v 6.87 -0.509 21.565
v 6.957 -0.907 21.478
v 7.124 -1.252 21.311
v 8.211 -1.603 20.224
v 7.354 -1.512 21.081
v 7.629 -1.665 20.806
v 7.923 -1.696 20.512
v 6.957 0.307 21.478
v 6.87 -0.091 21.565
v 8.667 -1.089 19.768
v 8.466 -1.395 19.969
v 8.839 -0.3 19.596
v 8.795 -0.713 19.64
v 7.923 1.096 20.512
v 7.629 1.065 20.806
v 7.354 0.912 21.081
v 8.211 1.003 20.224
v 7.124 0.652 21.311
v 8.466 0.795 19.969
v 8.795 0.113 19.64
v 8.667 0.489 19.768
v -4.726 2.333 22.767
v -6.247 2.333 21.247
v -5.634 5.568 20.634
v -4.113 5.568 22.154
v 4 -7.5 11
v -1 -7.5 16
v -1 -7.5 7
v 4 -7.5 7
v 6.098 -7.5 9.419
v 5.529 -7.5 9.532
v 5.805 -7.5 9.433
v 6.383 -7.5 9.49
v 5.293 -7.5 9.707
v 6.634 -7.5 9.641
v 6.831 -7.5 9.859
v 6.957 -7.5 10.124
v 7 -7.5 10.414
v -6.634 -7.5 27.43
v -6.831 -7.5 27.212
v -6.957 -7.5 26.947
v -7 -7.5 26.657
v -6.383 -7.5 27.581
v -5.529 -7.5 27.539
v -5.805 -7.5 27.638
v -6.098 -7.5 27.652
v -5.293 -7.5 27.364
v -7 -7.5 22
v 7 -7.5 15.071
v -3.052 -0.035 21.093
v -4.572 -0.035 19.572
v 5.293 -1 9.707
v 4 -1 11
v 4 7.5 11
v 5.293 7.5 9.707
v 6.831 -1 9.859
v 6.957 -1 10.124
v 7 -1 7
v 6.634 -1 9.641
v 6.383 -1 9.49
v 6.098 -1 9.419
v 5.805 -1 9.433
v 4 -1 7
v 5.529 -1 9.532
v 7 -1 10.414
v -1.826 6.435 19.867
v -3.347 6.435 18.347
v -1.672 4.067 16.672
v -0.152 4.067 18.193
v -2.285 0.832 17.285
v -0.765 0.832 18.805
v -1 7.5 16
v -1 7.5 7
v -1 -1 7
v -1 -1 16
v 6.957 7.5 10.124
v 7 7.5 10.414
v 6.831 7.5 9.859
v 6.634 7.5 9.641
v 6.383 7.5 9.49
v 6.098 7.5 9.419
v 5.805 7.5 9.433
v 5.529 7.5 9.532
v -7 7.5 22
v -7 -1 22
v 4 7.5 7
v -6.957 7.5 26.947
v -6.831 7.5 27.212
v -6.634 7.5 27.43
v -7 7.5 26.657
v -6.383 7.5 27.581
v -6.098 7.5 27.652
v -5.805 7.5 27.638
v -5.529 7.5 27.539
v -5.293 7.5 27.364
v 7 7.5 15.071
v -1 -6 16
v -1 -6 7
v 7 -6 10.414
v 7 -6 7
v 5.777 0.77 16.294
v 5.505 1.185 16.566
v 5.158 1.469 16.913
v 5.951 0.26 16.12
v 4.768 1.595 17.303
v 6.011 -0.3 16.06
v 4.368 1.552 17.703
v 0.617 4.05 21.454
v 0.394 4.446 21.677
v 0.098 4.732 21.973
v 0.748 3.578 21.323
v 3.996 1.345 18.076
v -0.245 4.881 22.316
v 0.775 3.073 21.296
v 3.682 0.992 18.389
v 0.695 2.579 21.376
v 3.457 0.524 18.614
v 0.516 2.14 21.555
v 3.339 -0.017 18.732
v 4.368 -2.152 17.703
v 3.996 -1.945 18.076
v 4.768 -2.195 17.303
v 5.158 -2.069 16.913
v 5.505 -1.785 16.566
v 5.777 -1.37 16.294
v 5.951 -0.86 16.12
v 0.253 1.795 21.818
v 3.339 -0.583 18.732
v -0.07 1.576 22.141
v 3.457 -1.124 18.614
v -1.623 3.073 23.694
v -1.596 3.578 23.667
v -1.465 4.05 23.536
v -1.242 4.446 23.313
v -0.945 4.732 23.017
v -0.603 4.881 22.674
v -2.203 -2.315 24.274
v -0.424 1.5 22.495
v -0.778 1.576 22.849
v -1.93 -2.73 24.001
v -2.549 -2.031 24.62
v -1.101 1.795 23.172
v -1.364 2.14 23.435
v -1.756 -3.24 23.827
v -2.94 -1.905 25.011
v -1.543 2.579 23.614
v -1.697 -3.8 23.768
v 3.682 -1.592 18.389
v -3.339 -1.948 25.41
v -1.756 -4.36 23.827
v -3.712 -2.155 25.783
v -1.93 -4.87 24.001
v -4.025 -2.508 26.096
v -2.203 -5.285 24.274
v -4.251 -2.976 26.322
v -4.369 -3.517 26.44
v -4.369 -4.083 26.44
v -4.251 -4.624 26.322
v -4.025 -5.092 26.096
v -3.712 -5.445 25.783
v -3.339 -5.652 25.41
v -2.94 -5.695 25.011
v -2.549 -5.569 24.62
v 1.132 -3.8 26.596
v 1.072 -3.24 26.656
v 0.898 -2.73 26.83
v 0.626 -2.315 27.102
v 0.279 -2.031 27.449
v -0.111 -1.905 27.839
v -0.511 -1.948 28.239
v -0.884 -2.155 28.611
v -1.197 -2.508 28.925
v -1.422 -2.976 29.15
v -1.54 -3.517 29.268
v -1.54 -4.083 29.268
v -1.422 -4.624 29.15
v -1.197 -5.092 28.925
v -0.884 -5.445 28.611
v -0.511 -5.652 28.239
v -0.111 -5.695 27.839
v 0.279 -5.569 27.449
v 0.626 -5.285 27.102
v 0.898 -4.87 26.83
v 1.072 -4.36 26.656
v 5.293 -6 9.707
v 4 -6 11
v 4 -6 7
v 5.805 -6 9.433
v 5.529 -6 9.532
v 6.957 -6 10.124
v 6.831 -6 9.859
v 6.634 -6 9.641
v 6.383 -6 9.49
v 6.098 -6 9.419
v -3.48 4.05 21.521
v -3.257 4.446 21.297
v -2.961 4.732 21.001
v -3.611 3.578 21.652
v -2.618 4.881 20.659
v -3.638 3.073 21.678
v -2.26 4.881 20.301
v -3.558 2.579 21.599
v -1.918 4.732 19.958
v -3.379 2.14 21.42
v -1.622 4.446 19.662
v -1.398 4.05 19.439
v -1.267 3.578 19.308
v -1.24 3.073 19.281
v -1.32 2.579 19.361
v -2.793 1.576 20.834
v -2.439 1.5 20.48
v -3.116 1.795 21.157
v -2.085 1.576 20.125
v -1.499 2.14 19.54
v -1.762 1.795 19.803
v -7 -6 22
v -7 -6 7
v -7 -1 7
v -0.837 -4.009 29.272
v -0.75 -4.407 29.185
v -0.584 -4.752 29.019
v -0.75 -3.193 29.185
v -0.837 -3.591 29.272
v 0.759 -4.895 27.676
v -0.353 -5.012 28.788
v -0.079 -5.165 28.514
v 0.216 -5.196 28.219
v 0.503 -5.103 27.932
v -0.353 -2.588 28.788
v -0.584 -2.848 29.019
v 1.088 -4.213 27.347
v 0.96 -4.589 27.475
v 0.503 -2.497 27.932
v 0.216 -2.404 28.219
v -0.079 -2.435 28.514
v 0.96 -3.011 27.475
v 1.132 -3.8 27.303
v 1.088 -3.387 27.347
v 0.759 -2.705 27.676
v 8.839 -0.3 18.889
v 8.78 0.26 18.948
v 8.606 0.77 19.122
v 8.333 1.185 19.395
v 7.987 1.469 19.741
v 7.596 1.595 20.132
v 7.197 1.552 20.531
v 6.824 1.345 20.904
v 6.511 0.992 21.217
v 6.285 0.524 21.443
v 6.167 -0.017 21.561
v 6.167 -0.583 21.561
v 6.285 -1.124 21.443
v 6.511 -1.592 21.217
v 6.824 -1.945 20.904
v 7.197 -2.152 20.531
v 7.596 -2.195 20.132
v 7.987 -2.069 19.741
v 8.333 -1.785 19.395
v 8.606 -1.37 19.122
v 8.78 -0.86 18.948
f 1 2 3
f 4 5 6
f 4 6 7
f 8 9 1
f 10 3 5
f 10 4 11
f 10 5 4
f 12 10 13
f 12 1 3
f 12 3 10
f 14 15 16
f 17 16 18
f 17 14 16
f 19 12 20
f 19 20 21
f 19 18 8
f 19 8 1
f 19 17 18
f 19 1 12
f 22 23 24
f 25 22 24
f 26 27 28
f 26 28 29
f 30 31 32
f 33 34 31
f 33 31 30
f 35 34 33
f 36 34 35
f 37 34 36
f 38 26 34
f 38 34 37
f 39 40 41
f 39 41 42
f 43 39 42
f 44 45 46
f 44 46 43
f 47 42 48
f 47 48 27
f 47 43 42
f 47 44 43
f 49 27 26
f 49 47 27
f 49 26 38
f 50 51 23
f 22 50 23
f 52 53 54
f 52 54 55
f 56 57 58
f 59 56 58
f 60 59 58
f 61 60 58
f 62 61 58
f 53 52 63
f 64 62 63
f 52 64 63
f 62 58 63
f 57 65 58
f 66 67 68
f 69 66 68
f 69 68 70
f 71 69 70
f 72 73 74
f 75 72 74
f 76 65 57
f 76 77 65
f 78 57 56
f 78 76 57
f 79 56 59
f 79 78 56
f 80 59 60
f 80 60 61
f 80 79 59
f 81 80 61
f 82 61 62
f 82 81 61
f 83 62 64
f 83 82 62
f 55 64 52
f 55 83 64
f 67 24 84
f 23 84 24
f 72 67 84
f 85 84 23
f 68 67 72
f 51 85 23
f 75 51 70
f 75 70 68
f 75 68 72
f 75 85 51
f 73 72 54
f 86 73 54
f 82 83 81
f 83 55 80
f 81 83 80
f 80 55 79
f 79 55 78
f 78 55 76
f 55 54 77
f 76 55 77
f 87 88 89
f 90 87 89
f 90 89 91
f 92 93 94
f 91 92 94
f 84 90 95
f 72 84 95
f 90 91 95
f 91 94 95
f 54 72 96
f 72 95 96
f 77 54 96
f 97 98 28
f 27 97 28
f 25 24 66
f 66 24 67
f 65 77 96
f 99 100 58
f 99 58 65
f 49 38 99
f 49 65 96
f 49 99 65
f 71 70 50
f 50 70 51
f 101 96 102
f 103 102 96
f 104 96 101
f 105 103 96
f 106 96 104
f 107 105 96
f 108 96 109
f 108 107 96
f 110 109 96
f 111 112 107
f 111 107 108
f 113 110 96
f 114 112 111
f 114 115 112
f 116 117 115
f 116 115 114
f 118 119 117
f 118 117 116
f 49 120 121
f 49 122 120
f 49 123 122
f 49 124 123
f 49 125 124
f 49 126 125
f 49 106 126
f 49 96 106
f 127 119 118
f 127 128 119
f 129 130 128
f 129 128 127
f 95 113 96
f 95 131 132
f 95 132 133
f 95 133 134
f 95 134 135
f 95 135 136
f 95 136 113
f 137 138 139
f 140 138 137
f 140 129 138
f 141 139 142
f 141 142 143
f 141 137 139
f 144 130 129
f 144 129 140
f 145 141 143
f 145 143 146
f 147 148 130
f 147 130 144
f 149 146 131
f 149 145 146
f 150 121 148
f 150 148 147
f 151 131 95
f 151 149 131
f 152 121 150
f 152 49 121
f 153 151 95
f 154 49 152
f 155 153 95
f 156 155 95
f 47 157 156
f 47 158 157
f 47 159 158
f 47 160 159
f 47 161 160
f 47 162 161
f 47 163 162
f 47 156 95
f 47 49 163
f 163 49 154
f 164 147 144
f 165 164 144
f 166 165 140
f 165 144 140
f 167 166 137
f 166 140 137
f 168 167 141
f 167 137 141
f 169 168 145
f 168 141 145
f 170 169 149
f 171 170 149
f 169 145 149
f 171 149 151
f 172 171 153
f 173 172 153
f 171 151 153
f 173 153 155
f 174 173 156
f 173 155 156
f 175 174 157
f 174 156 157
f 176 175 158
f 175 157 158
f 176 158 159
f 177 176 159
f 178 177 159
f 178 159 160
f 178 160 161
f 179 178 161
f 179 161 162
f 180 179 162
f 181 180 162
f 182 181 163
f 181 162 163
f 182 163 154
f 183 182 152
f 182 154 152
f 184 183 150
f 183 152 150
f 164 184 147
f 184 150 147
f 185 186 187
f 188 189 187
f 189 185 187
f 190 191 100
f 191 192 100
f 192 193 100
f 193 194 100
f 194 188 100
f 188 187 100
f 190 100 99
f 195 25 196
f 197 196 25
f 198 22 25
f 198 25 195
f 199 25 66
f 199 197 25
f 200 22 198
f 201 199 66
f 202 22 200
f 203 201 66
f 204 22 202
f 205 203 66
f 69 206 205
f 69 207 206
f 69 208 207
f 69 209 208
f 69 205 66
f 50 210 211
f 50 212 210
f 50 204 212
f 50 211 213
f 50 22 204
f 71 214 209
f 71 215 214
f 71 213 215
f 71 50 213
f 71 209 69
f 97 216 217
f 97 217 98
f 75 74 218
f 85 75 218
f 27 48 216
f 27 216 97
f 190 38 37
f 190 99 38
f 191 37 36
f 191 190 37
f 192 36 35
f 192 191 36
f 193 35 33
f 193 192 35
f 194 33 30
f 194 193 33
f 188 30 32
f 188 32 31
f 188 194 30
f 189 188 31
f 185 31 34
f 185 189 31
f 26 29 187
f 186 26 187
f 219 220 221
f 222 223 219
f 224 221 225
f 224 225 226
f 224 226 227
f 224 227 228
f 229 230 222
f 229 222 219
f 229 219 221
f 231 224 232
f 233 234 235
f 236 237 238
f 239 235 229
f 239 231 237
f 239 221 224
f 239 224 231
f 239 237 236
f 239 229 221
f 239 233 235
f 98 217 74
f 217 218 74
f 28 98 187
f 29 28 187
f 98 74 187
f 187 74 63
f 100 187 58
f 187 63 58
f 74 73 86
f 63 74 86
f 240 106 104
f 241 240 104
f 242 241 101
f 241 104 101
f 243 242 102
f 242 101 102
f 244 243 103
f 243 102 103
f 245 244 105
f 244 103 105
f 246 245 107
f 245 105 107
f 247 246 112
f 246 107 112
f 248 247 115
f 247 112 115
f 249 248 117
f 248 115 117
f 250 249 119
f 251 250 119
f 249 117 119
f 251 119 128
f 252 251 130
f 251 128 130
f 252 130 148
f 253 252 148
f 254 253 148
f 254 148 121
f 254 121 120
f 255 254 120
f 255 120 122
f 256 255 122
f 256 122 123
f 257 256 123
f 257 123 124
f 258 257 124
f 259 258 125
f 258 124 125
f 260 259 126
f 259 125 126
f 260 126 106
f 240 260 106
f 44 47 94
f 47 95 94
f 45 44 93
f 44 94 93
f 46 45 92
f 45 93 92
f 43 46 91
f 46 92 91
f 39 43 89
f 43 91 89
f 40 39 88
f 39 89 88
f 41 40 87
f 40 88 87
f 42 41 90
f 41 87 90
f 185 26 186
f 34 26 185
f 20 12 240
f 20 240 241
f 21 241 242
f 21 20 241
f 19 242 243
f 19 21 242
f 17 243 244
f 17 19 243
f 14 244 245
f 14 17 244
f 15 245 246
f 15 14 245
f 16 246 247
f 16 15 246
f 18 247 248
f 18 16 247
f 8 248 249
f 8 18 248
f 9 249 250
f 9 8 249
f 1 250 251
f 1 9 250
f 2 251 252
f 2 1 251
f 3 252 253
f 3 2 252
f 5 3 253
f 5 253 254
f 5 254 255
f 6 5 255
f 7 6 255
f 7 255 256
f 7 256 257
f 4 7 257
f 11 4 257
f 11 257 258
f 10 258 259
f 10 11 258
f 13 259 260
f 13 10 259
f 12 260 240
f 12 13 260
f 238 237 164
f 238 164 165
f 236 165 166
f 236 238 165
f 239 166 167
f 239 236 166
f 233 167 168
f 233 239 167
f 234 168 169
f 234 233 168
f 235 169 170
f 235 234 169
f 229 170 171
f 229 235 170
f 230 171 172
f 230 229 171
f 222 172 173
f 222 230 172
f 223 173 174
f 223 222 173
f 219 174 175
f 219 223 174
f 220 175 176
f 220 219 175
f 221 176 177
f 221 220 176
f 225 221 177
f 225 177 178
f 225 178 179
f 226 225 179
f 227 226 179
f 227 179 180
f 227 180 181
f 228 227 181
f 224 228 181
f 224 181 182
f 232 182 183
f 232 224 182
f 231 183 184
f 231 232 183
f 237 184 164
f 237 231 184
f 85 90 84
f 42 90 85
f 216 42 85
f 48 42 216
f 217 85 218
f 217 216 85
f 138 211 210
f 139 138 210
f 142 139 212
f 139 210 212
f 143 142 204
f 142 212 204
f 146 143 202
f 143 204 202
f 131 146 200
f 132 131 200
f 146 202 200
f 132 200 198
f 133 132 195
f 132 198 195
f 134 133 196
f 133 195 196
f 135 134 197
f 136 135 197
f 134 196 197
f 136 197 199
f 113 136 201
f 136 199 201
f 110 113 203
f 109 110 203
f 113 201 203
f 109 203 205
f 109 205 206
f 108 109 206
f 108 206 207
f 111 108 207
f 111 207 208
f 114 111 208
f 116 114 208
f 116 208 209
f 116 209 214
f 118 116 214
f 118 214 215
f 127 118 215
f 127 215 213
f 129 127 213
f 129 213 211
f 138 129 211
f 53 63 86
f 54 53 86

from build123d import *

# Parameters (mm, degrees)
PAD001_START         = 10
PAD001_DEPTH         = 15
POCKET004_DEPTH      = 7.501
POCKET004_DEPTH_BACK = 7.501
PAD002_DEPTH         = 15
POCKET005_DEPTH      = 2.15
SKETCH011_R          = 1.7
HOLE001_DEPTH        = 12.7504949366
SKETCH012_R          = 1.9
PAD003_DEPTH         = 4.5
CHAMFER_SIZE         = 0.5
FILLET001_R          = 1


with BuildPart() as part:
    # Sketch007 → Pad001 (new body)
    with BuildSketch(Plane.XY.offset(PAD001_START)):
        Polygon((-7, -6), (-1, -6), (-1, -7.5), (4, -7.5), (4, -6), (7, -6), (7, -1), (4, -1), (4, 7.5), (-1, 7.5), (-1, -1), (-7, -1), align=None)
    extrude(amount=PAD001_DEPTH)

    # Sketch008 → Pocket004 (cut, two sides)
    with BuildSketch(Plane.XZ) as pocket004_sk:
        Polygon((-7, 25), (7, 11), (7, 25), align=None)
    extrude(amount=-POCKET004_DEPTH, mode=Mode.SUBTRACT)
    extrude(pocket004_sk.sketch, amount=POCKET004_DEPTH_BACK, mode=Mode.SUBTRACT)

    # Sketch009 (on Face8 of Pocket004) → Pad002 (join)
    with BuildSketch(Plane.XZ.offset(7.5)):
        Polygon((-7, 25), (7, 11), (7, 18.0710678119), (-7, 32.0710678119), align=None)
    extrude(amount=-PAD002_DEPTH)

    # Sketch010 (on Face12 of Pad002) → Pocket005 (cut)
    with BuildSketch(Plane(origin=(9, 0, 9), x_dir=(0.7071067812, 0, -0.7071067812), z_dir=(-0.7071067812, 0, -0.7071067812))):
        Polygon((-21.5619467058, -2.3333103769), (-20.6952570827, -5.5678400847), (-17.4607273749, -6.4345297078), (-15.0928872902, -4.0666896231), (-15.9595769133, -0.8321599153), (-19.1941066211, 0.0345297078), align=None)
    extrude(amount=-POCKET005_DEPTH, mode=Mode.SUBTRACT)

    # Sketch011 (on Face29 of Pocket005) → Hole001 (cut, through all)
    with BuildSketch(Plane(origin=(10.5202795796, 0, 10.5202795796), x_dir=(0, -1, 0), z_dir=(-0.7071067812, 0, -0.7071067812))):
        with Locations((-3.2, 18.327416998)):
            Circle(SKETCH011_R)
    extrude(amount=-HOLE001_DEPTH, mode=Mode.SUBTRACT)

    # Sketch012 (on Face9 of Hole001) → Pad003 (join)
    with BuildSketch(Plane(origin=(12.5355339059, 0, 12.5355339059), x_dir=(0.7071067812, 0, -0.7071067812), z_dir=(0.7071067812, 0, 0.7071067812))):
        with Locations((-22.027416998, -3.8)):
            Circle(SKETCH012_R)
        with Locations((-11.127416998, -0.3)):
            Circle(SKETCH012_R)
    extrude(amount=PAD003_DEPTH)

    # Chamfer
    chamfer_edges = [part.edges().sort_by_distance(p)[0] for p in [
        (-1.201724, -3.8, 32.636753),
        (6.50574, -0.3, 24.929289),
    ]]
    chamfer(chamfer_edges, length=CHAMFER_SIZE)

    # Fillet001
    fillet001_edges = [part.edges().sort_by_distance(p)[0] for p in [
        (-7, 0, 32.071068),
        (7, 3.25, 11),
        (7, -6.75, 11),
    ]]
    fillet(fillet001_edges, radius=FILLET001_R)


with BuildPart() as part_1:
    # Body001 placement: moved
    add(part.part.moved(Location((0, 0, -3))))


solid = part_1.part
